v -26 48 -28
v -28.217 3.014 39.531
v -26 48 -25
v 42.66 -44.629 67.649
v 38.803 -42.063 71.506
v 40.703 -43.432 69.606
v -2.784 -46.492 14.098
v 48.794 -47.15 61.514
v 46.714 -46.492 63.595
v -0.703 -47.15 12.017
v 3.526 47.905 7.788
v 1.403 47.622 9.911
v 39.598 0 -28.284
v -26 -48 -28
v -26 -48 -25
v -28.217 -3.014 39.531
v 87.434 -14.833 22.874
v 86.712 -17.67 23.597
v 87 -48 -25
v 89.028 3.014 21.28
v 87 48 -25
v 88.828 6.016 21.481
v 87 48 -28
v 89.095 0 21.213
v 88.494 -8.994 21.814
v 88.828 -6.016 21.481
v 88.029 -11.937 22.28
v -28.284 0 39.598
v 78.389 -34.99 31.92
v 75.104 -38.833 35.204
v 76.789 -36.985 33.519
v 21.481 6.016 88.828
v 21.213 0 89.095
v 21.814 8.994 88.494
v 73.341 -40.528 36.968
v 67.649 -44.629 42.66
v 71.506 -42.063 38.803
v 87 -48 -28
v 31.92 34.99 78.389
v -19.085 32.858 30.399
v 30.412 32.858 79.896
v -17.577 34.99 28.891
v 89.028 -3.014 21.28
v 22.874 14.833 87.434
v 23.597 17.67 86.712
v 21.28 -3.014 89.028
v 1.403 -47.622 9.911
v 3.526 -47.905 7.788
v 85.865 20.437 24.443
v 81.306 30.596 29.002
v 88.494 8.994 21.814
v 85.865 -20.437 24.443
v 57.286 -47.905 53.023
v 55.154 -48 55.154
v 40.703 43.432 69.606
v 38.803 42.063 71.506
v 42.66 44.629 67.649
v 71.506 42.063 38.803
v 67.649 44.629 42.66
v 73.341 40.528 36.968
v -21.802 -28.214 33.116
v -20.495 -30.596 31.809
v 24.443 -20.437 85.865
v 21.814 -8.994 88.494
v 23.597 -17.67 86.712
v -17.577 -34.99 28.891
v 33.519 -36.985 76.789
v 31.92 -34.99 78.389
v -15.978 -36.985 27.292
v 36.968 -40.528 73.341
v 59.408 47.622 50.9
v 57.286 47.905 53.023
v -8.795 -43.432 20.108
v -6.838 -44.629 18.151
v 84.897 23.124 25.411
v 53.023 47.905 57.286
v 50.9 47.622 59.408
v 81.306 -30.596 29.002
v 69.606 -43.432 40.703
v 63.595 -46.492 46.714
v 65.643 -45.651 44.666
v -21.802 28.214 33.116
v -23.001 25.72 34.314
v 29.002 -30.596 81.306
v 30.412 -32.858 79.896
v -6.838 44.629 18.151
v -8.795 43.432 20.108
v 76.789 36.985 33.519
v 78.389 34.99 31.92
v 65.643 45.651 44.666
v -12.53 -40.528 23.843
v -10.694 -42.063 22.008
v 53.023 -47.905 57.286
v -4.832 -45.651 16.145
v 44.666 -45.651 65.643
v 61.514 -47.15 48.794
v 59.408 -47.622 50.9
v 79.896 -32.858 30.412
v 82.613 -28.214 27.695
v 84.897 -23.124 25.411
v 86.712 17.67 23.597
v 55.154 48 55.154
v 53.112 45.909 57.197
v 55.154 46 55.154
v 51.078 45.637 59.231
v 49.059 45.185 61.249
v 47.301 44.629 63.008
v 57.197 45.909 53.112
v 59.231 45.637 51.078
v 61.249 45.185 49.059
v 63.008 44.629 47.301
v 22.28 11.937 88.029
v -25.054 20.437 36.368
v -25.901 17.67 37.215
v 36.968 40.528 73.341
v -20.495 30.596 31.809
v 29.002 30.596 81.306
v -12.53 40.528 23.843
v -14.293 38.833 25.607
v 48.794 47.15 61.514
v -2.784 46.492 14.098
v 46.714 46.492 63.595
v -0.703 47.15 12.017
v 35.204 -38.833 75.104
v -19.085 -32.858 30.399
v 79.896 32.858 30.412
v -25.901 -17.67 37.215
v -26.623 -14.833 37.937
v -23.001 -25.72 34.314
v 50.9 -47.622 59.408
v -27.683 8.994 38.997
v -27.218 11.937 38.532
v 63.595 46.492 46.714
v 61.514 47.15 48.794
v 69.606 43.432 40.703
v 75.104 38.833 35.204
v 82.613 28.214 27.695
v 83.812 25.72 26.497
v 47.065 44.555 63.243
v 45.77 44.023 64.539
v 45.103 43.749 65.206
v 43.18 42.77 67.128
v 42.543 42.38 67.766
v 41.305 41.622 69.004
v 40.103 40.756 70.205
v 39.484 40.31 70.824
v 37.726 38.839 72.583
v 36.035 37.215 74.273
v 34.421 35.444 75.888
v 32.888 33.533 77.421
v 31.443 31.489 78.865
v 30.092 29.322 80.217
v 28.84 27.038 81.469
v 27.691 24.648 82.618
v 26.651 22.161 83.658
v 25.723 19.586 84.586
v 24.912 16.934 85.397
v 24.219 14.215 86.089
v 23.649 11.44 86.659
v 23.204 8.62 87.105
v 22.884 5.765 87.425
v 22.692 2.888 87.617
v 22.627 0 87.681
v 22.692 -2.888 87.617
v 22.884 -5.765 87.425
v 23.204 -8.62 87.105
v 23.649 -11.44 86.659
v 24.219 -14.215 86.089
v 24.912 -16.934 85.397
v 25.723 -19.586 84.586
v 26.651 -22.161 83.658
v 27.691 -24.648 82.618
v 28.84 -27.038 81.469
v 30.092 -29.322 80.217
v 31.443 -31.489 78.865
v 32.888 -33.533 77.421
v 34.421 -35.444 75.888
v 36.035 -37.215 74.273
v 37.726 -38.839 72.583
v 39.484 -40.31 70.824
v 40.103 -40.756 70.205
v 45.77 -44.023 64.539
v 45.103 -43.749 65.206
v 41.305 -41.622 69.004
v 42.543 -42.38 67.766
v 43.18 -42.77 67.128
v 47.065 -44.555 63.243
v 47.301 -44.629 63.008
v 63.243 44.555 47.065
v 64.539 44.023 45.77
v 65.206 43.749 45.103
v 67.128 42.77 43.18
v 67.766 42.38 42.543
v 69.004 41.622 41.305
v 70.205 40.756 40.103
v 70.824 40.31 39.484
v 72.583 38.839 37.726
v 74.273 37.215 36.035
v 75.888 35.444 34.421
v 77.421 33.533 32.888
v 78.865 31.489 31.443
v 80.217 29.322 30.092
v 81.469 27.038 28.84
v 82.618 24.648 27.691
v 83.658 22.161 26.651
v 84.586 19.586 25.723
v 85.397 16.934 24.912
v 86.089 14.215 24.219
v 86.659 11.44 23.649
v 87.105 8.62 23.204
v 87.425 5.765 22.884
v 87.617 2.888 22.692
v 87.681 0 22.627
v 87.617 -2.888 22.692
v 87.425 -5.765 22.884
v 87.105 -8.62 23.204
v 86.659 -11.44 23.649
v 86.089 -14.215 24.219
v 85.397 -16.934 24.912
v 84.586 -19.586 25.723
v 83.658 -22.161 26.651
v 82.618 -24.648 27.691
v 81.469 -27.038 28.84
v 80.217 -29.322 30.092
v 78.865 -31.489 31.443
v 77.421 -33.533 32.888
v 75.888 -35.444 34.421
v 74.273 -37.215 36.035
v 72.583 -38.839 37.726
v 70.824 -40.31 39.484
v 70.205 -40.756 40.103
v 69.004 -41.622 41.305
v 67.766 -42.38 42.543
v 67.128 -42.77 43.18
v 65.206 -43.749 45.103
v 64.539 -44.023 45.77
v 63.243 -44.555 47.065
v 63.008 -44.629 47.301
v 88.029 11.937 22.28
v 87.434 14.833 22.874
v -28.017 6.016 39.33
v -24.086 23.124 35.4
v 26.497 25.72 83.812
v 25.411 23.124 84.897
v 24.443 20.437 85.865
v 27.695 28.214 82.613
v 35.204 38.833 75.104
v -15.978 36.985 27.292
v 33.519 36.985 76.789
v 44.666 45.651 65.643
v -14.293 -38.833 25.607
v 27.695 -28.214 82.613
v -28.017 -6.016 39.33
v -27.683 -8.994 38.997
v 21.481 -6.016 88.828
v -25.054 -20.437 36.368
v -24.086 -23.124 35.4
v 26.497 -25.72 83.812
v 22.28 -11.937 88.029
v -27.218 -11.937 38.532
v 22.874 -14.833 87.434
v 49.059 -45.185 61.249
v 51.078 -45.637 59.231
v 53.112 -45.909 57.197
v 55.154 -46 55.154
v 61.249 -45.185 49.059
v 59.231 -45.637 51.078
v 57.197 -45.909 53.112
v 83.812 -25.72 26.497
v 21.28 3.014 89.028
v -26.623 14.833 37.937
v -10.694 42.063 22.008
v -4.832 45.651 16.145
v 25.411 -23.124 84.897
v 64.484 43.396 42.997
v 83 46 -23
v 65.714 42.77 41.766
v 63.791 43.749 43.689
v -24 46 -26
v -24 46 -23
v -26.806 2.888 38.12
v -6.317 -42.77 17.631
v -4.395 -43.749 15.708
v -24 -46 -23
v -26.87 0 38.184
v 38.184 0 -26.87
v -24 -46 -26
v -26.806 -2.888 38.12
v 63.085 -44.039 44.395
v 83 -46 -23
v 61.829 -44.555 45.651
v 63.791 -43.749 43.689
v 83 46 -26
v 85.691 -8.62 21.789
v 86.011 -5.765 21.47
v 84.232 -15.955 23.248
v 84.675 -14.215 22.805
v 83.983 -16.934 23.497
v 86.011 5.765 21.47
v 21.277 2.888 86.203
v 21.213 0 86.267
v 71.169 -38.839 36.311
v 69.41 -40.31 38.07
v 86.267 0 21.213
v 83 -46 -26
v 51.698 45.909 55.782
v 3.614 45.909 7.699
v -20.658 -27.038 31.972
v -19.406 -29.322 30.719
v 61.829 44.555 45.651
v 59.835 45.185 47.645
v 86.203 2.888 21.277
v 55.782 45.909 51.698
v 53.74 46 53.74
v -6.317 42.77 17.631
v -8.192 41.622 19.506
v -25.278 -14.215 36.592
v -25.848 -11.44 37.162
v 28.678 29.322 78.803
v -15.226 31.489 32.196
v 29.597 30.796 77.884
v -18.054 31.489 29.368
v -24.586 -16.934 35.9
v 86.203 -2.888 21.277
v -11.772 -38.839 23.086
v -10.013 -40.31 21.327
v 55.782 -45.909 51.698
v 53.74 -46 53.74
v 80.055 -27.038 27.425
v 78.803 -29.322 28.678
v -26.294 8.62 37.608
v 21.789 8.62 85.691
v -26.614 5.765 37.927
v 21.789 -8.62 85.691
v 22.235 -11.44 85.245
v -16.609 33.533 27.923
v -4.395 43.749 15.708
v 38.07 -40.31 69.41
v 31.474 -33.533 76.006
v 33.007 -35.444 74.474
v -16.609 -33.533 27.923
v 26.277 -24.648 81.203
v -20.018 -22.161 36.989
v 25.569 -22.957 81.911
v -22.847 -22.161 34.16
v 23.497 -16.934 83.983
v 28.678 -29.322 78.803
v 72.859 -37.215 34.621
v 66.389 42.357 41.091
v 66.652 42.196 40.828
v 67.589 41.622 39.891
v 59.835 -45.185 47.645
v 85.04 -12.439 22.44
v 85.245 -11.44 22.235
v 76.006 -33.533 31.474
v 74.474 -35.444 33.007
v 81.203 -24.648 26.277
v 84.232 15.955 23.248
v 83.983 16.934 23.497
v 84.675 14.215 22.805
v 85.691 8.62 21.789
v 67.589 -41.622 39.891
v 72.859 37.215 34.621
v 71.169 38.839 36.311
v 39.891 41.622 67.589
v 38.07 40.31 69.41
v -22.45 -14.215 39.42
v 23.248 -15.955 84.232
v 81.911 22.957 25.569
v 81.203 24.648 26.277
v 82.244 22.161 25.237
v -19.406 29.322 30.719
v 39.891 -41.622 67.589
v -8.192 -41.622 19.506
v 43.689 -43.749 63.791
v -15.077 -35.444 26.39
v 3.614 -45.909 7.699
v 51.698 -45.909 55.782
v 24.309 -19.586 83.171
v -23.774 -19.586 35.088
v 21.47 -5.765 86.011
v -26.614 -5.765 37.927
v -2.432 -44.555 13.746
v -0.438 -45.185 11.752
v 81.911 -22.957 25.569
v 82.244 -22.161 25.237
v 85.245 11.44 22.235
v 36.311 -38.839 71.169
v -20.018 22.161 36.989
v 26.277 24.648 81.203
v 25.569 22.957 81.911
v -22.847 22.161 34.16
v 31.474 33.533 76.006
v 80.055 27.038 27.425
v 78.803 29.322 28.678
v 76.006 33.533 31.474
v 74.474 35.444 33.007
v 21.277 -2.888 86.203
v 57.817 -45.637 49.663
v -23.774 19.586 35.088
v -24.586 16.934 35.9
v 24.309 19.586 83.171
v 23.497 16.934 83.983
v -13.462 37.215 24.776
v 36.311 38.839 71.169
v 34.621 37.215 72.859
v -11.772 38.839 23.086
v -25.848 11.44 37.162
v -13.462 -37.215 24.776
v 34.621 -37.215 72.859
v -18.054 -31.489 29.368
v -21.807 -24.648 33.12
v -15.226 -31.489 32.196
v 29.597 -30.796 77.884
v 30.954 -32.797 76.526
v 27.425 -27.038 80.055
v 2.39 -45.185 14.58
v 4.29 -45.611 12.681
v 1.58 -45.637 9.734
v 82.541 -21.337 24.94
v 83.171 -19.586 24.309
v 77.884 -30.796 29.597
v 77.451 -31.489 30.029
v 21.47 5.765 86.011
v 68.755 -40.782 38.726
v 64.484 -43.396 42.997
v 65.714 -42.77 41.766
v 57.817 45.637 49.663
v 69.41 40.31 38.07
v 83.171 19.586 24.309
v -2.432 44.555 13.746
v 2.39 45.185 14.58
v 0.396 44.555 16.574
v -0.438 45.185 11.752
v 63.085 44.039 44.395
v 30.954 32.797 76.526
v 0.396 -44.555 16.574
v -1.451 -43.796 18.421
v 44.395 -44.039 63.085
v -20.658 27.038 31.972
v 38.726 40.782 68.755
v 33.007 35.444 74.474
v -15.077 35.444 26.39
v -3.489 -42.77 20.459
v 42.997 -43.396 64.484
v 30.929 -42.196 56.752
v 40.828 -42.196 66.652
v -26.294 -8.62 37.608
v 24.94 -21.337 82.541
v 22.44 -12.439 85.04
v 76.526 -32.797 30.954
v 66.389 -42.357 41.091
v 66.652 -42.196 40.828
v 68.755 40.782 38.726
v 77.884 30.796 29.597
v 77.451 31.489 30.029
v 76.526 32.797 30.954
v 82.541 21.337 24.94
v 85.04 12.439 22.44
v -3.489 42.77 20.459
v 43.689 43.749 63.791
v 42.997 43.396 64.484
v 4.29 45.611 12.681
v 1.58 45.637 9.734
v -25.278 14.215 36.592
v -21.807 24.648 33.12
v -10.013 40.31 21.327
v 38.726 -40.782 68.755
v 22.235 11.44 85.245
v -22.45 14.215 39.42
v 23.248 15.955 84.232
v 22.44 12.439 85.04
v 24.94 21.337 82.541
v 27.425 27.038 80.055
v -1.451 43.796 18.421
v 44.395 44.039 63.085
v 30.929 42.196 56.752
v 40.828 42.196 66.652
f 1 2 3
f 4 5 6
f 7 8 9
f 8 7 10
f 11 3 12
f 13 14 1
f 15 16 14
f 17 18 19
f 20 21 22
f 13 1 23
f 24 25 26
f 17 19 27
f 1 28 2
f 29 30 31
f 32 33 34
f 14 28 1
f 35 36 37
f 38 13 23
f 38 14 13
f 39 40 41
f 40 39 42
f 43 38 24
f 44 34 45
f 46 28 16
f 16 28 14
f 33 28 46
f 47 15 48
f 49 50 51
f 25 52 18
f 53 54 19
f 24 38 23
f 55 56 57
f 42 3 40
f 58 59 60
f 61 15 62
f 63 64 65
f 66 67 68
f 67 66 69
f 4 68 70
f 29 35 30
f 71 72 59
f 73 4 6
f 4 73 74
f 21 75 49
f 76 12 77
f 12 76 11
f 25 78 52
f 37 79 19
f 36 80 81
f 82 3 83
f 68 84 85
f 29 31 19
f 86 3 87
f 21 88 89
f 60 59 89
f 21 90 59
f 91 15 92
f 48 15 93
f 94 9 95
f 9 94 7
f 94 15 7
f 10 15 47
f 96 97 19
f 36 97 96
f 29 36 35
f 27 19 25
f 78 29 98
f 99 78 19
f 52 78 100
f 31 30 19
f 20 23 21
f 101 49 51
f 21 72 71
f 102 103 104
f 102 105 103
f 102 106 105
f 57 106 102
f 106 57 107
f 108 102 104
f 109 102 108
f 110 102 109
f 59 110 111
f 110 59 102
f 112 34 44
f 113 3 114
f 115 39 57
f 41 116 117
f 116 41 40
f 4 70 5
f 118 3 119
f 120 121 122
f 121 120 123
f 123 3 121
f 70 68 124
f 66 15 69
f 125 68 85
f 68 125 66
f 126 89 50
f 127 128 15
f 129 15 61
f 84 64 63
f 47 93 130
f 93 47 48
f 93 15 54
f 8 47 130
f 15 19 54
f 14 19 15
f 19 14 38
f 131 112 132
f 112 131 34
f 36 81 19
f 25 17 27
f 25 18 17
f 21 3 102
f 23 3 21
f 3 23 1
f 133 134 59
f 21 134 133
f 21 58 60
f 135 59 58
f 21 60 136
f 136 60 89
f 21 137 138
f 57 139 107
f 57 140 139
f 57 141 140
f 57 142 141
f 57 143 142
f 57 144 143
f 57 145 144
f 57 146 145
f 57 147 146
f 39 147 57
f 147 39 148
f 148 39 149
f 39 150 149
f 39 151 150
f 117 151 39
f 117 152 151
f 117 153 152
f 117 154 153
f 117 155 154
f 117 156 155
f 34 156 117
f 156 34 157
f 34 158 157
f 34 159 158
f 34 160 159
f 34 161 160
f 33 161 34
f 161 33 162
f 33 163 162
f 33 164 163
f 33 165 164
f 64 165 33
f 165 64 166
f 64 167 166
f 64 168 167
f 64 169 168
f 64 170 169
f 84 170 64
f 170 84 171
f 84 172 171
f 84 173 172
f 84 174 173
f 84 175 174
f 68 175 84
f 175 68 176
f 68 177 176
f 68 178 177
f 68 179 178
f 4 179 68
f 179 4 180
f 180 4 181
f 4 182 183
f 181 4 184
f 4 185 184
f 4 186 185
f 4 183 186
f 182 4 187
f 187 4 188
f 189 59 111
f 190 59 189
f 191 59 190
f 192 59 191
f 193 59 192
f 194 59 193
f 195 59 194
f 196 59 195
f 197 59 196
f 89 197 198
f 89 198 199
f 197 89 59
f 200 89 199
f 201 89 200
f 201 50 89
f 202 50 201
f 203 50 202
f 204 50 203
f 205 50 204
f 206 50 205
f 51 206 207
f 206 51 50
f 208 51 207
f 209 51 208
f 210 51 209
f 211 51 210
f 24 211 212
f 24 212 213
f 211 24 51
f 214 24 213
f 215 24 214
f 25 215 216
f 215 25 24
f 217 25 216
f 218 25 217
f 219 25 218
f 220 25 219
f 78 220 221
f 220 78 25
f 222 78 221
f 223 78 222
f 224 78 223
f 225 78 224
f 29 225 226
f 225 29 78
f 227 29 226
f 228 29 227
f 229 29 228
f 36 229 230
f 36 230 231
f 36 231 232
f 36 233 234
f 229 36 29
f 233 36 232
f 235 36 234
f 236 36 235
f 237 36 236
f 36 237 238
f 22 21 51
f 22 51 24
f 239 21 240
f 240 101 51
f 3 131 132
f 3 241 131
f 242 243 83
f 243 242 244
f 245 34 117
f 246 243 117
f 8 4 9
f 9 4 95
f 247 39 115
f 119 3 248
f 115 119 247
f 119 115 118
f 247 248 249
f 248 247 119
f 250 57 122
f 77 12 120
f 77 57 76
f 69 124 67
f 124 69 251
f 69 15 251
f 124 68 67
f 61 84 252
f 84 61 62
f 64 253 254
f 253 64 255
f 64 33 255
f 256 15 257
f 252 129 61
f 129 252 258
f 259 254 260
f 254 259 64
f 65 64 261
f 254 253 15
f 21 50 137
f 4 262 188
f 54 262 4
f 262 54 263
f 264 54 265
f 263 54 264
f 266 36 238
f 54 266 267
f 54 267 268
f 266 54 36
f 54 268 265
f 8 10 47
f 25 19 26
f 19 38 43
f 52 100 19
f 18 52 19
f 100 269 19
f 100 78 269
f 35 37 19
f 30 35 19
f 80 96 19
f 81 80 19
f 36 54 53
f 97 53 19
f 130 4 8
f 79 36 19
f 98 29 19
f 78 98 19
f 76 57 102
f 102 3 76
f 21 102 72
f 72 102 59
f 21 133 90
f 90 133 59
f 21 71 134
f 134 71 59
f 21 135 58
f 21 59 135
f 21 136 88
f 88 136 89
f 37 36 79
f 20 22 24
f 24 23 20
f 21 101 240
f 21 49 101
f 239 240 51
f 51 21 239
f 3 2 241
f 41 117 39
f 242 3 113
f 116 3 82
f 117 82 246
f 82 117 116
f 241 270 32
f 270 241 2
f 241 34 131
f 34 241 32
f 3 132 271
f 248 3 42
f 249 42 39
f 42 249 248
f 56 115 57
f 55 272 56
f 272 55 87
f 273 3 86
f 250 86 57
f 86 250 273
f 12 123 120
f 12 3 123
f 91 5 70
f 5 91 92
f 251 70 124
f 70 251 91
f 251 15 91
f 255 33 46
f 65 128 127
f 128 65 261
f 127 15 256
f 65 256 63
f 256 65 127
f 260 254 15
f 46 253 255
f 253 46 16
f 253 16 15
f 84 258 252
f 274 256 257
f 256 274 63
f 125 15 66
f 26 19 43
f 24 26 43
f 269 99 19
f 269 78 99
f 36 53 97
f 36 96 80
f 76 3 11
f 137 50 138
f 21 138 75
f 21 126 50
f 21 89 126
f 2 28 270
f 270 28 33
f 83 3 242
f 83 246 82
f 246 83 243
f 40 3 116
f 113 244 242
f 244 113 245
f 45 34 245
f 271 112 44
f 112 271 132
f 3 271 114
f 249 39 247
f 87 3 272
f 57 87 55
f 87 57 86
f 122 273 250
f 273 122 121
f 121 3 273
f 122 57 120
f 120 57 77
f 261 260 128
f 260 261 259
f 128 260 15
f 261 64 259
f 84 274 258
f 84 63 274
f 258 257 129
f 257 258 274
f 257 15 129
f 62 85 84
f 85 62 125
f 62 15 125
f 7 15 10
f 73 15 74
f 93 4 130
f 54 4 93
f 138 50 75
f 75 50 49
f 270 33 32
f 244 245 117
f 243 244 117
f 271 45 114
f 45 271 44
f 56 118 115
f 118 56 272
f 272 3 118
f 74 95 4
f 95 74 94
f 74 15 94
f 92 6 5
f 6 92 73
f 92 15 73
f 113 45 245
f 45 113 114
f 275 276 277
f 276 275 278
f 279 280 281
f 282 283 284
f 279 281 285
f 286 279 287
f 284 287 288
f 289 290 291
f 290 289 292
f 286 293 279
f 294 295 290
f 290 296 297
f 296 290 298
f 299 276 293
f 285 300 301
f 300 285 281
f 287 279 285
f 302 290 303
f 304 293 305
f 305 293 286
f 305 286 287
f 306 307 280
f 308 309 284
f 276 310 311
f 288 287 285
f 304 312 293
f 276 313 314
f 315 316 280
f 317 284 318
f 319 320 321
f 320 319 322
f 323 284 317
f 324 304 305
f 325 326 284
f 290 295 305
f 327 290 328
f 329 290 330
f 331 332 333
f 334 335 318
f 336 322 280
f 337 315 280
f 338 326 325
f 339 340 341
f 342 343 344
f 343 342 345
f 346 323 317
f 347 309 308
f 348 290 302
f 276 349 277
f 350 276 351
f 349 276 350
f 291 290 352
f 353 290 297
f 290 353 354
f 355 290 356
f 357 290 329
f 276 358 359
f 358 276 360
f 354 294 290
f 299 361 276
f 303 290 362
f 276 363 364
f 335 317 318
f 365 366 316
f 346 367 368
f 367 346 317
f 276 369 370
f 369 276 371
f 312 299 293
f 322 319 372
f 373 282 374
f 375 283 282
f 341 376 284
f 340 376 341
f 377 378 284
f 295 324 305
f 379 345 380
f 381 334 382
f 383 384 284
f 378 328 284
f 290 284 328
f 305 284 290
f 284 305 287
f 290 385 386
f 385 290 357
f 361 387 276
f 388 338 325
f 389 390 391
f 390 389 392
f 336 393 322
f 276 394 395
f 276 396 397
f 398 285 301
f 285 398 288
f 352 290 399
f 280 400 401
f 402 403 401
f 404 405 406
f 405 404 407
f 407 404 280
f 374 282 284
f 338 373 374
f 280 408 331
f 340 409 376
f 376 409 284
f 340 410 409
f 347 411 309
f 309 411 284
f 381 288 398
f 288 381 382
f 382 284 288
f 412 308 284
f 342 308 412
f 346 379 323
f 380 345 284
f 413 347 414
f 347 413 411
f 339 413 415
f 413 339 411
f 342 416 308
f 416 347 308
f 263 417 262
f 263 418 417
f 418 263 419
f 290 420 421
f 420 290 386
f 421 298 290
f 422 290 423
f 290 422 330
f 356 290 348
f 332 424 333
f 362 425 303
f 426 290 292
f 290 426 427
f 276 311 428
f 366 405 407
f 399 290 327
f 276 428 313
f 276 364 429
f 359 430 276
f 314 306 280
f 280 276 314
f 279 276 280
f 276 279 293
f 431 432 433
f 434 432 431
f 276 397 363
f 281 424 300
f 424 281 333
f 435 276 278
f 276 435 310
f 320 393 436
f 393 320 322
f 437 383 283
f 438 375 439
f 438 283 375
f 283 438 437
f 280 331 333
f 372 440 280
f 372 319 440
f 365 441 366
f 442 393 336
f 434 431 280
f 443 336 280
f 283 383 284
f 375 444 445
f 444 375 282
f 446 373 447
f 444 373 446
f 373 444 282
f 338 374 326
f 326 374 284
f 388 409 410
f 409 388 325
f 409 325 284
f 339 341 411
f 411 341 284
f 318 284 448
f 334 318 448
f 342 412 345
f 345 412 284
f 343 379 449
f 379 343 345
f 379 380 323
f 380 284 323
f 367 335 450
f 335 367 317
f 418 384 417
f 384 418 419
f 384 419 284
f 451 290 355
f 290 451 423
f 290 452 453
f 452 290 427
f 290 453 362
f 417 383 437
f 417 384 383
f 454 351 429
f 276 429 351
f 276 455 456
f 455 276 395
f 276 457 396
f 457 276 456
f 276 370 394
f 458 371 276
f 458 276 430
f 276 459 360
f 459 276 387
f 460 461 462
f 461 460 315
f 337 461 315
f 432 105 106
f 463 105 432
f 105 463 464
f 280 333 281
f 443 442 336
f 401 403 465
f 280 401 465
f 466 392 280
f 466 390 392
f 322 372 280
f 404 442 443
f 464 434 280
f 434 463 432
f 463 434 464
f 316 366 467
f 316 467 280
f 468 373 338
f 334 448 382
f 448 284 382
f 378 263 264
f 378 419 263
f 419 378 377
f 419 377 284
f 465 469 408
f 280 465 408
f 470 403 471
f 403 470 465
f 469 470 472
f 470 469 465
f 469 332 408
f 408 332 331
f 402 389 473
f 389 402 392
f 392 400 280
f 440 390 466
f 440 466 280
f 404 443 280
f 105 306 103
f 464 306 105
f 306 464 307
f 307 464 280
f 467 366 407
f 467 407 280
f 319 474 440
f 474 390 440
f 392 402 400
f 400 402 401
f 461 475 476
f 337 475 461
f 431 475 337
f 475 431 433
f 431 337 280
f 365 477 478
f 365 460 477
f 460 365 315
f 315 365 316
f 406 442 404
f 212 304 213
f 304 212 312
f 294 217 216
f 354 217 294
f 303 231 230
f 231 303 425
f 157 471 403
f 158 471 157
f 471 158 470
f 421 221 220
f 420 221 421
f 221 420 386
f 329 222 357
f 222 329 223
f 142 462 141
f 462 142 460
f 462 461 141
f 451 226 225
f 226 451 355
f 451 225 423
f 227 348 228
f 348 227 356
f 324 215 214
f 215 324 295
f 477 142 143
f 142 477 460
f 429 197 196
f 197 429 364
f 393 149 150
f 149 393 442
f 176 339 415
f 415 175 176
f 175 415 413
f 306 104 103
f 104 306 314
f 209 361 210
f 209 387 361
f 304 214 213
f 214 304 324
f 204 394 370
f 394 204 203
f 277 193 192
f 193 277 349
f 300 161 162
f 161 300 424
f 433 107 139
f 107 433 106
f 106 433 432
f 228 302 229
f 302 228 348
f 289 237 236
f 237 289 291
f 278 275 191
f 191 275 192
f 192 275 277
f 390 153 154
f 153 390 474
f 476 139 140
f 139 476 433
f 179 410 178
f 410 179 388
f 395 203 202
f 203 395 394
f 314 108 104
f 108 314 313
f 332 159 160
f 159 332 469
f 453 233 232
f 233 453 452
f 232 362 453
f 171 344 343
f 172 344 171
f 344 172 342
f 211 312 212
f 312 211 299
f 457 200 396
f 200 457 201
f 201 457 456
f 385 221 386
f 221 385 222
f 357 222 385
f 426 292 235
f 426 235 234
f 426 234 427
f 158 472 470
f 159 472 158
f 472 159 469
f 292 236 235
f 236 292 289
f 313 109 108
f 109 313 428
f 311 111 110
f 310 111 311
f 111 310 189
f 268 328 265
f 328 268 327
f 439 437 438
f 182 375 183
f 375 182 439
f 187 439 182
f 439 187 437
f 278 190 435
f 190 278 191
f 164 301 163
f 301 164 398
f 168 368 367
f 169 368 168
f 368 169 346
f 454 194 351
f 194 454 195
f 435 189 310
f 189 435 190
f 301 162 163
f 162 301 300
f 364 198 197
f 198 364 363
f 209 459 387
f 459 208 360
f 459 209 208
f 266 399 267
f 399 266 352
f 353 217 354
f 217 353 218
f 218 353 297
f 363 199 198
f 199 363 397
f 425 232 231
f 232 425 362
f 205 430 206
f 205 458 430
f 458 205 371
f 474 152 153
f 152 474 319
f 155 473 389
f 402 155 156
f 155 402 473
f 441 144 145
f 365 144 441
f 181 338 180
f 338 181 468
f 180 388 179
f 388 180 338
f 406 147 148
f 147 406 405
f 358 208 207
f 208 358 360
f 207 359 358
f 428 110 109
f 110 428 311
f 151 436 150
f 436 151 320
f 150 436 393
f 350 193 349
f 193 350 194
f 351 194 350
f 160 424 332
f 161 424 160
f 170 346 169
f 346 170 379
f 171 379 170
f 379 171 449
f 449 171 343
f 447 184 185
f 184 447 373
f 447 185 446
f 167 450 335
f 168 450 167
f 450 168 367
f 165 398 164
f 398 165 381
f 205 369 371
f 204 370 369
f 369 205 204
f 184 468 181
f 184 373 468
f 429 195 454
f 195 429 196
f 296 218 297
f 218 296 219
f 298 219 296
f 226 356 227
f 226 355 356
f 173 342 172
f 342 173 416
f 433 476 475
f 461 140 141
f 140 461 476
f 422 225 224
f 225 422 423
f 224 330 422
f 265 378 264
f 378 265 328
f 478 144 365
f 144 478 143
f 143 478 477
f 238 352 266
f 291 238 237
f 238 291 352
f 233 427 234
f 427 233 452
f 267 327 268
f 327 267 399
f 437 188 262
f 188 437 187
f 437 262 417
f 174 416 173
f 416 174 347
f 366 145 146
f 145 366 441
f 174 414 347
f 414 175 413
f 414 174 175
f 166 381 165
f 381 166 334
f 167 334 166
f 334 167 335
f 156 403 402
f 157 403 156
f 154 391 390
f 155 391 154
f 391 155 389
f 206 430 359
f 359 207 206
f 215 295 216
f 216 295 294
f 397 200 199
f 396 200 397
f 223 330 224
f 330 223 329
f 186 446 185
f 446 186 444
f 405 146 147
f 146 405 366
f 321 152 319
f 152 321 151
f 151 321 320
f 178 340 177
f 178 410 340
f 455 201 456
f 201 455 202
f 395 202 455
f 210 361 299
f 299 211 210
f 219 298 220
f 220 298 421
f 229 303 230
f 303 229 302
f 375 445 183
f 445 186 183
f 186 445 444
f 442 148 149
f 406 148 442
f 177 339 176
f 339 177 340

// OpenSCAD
// file: lib/arduino.scad
module stepper(plusminus=0,tolerance=0){
	translate([0,-8,0]) rotate([0,90,0]){
		tl=tolerance;
		tz=tolerance;
		txy=tolerance;
		motorW=28+tl;
		motorH=19+tl;
		if (plusminus>0){
			translate([0,0, 35/2]) rotate([0,90,0])  cylinder(4,3.5/2,3.5/2);
			translate([0,0,-35/2]) rotate([0,90,0])  cylinder(4,3.5/2,3.5/2);
		}
		if (plusminus<0){
			translate([-5-0.111,8,0]) rotate([0,90,0])  cylinder(5+0.222,10/2,10/2);
		}
		// full motor view
		if (plusminus==0){
			difference(){
				union(){
					translate([0,0, 35/2]) rotate([0,90,0])  cylinder(1,7/2+txy,7/2+txy); // ear
					translate([0,0,-35/2]) rotate([0,90,0])  cylinder(1,7/2+txy,7/2+txy); // ear
					translate([0.5,0,0])   cube([1,7+2*txy,35], center=true); // ear box
				}
				translate([-0.111,0, 35/2]) rotate([0,90,0])  cylinder(4+0.222,3.5/2,3.5/2); // holes
				translate([-0.111,0,-35/2]) rotate([0,90,0])  cylinder(4+0.222,3.5/2,3.5/2); // holes
			}
			translate([0,0,0])   rotate([0,90,0])  cylinder(motorH,motorW/2,motorW/2); //motor
			translate([-2, 8,0]) rotate([0,90,0])  cylinder(2,10/2+txy,10/2+txy); 
			translate([-10,8,0]) rotate([0,90,0])  
				intersection(){
					cylinder(10,5/2+txy,5/2+txy);  //shaft
					cubeZ0(5/2+2*txy,10,10);
				}
			translate([motorH/2,-18/2,0]) cube([motorH,18+txy,18+2*txy],center=true);
		}
	}
}

module stepper_(plusminus,tolerance=0){
		tl=tolerance;
		motorW=28+tl;
		motorH=19+tl;
		if (plusminus>0){
			translate([0,0, 35/2]) rotate([0,90,0])  cylinder(4,3.5/2,3.5/2);
			translate([0,0,-35/2]) rotate([0,90,0])  cylinder(4,3.5/2,3.5/2);
		}
		if (plusminus<0){
			translate([-5-0.111,8,0]) rotate([0,90,0])  cylinder(5+0.222,10/2,10/2);
		}
		if (plusminus==0){
			difference(){
				union(){
					translate([0,0, 35/2]) rotate([0,90,0])  cylinder(1,7/2,7/2);
					translate([0,0,-35/2]) rotate([0,90,0])  cylinder(1,7/2,7/2);
					translate([0.5,0,0])   cube([1,7,35], center=true);
				}
				translate([-0.111,0, 35/2]) rotate([0,90,0])  cylinder(4+0.222,3.5/2,3.5/2); // holes
				translate([-0.111,0,-35/2]) rotate([0,90,0])  cylinder(4+0.222,3.5/2,3.5/2); // holes
			}
			translate([0,0,0]) rotate([0,90,0])  cylinder(motorH,motorW/2,motorW/2); //motor
			translate([-2, 8,0]) rotate([0,90,0])  cylinder(2,10/2,10/2); 
			translate([-10,8,0]) rotate([0,90,0])  cylinder(10,5/2,5/2);  //shaft
			translate([motorH/2,-18/2,0]) cube([motorH,18,18],center=true);
		}
}
// file: lib/mylib.scad
/*
module rounded_cube(dx,dy,dz,r){
    union(){
        translate ([r,0,0]) cube([dx-2*r,dy,dz]);
        translate ([0,r,0]) cube([dx,dy-2*r,dz]);
        translate ([r,r,0]) cylinder(dz,r,r);
        translate ([dx-r,r,0]) cylinder(dz,r,r);
        translate ([r,dy-r,0]) cylinder(dz,r,r);
        translate ([dx-r,dy-r,0]) cylinder(dz,r,r);
    }
}
*/

module torus(R,r) {
    rotate_extrude(convexity = 10)
    translate([R, 0, 0]) circle(r = r, $fn = 100);
}

module disk(R,r){
    rotate_extrude(convexity = 10)
    { 
        intersection(){
            union(){
                translate([R-r, 0, 0]) circle(r = r, $fn = 100);
                translate([(R-r)/2,0]) square([R-r,r*2],center=true);        
            }
            translate([0,-r,0]) square([R,2*r]);            
        }
    }
}


module rounded_cylinder(h,r,rb,rt){
    rotate_extrude(convexity = 10) 
    mirror() rotate([0,0,90])
    intersection(){
        square([h,r]);
        union(){
            translate([h-rt,0,0]) square([rt,r-rt]);
            translate([h-rt,r-rt,0]) 
            intersection(){
                circle(rt);
                square(rt*2);
            }
            square([rb,r-rb]);
            translate([0,r-rb,0]) intersection(){
                translate([rb,0,0]) circle(rb);
                translate([-rb,0,0]) square(rb*2);
            }    
            translate([rb,0,0]) square([h-rt-rb,r]);
        }
    }
    /*
    translate([0,0,h-rt]) disk(r,rt);
    translate([0,0,rb]) cylinder(h-rb-rt,r,r);
    translate([0,0,rb]) disk(r,rb);
    */
}

module rounded_cube(w,l,h,rv,rb,rt){
	hull(){
		translate([-w/2+rv,-l/2+rv,0]) rounded_cylinder(h,rv,rb,rt);
		translate([-w/2+rv,+l/2-rv,0]) rounded_cylinder(h,rv,rb,rt);
		translate([+w/2-rv,+l/2-rv,0]) rounded_cylinder(h,rv,rb,rt);
		translate([+w/2-rv,-l/2+rv,0]) rounded_cylinder(h,rv,rb,rt);
	}
    
   /* 
    minkowski(){
        cube([w-2*rv,l-2*rv,h-rb-rt],center=true) ;
        //rounded_cylinder(rb+rt,rv,rb,rt);
        rounded_cylinder(7,10,5,2);
    }
    */
    
}

module cubeZ0(xSize,ySize,zSize){
    translate([0,0,zSize/2]) cube([xSize,ySize,zSize],center=true);
}
module cubeYZ0(xSize,ySize,zSize){
    translate([0,-ySize/2,0]) cube([xSize,ySize,zSize]);
}
module cubeXZ0(xSize,ySize,zSize){
    translate([-xSize/2,0,0]) cube([xSize,ySize,zSize]);
}
module cubeYZ0(xSize,ySize,zSize){
    translate([0,-ySize/2,0]) cube([xSize,ySize,zSize]);
}

module skiletZ0(xSize,ySize,zSize,step=0.8,w=0.1){
    for(y=[-ySize/2:step:ySize/2]){
		for(x=[-xSize/2:step:xSize/2]){
			translate([x,y,0]) cubeZ0(w,w,zSize);
		}
    }

}


module arced_cube(xSize,ySize,zCube){
	radius = xSize/2;
	cubeZ0(ySize,radius*2,zCube);
	
	translate([0,0,zCube]) intersection(){
		cubeZ0(ySize,radius*2,radius);
		rotate([0,90,0]) translate([0,0,-ySize/2]) cylinder(ySize,radius,radius);
	}
	
}

module prism(l, w, h){
       polyhedron(
               points=[[0,0,0], [l,0,0], [l,w,0], [0,w,0], [0,w,h], [l,w,h]],
               faces=[[0,1,2,3],[5,4,3,2],[0,4,5,1],[0,3,4],[5,2,1]]
               );
       
    /*   // preview unfolded (do not include in your function
       z = 0.08;
       separation = 2;
       border = .2;
       translate([0,w+separation,0])
           cube([l,w,z]);
       translate([0,w+separation+w+border,0])
           cube([l,h,z]);
       translate([0,w+separation+w+border+h+border,0])
           cube([l,sqrt(w*w+h*h),z]);
       translate([l+border,w+separation+w+border+h+border,0])
           polyhedron(
                   points=[[0,0,0],[h,0,0],[0,sqrt(w*w+h*h),0], [0,0,z],[h,0,z],[0,sqrt(w*w+h*h),z]],
                   faces=[[0,1,2], [3,5,4], [0,3,4,1], [1,4,5,2], [2,5,3,0]]
                   );
       translate([0-border,w+separation+w+border+h+border,0])
           polyhedron(
                   points=[[0,0,0],[0-h,0,0],[0,sqrt(w*w+h*h),0], [0,0,z],[0-h,0,z],[0,sqrt(w*w+h*h),z]],
                   faces=[[1,0,2],[5,3,4],[0,1,4,3],[1,2,5,4],[2,0,3,5]]
                   );
				   */
       }
       
module cylinder_xyz(x,y,z,r0,r1){
    h = sqrt(x*x+y*y+z*z);
    rotate([0,acos(z/h),atan2(y,x)]) cylinder(h,r0,r1);
}       
module cylinder_2xyz(x0,y0,z0,x1,y1,z1,r0,r1){
    dx=x1-x0;
    dy=y1-y0;
    dz=z1-z0;
    translate([x0,y0,z0]) cylinder_xyz(dx,dy,dz,r0,r1);

}
       $fn=100;
//cylinder_xyz( 20,20,20,1);
//cylinder_2xyz(10,10,10,1, 20,20,20,1,1);

//      b1 ------- b2 
//     /          /|
//    b0 -------- b3
//    |          |
//
//                |
//    |         | |
//    | a1------+-a2 
//    |/        |/
//    a0------- a3

module poly8(a0,a1,a2,a3,
             b0,b1,b2,b3)
{
    polyhedron(points=[a0,a1,a2,a3, b0,b1,b2,b3],
               faces = [[0,3,2,1],[4,4+1,4+2,4+3],[0,1,4+1,4],[1,2,4+2,4+1],[3,4+3,4+2,2],[0,4,4+3,3]]);
    
    
}

//poly8 ([0,0,0],[0,0,1],[1,0,1],[1,1,0],  [0,20,0],[0,20,1],[1,20,1],[1,19,0] );

/*
intersection(){
    cube(10);
    poly8 ([0,0,0],[0,3,0],[3,3,0],[3,0,0],        [0,0,3],[0,1,3],[1,1,3],[1,0,3]);
}
*/
//    poly8 ([0,0,0],[0,3,0],[3,3,0],[3,0,0],        [0,0,3],[0,1,3],[1,1,3],[1,0,3]);




module rounded_arc_int_(h,rb,wb,rbint,rbext,
                          rt,wt,rtint,rtext, ang)  
{
    difference(){
        rotate_extrude(angle=ang) 
        hull(){
            translate([rb+rbint,rbint]) circle(rbint);
            translate([rb+wb-rbext,rbext]) circle(rbext);
            
            translate([rt+rtint,h-rtint]) circle(rtint);
            translate([rt+wt-rtext,h-rtext]) circle(rtext);
        }   
    }

          
}
module rounded_arc_int(h,rb,wb,rbint,rbext,
                         rt,wt,rtint,rtext, ang, roundendface=false)  
 {
    
    if (roundendface){
        difference(){
            rounded_arc_int_(h,rb,wb,rbint,rbext, rt,wt,rtint,rtext, ang);  
            rotate ([0,0,ang]) 
                mirror([0,1,0]) 
                    poly8(  [rb,0,0],[rb,rbint,0],[rb+wb,rbext,0],[rb+wb,0,0],
                            [rt,0,h],[rt,rtint,h],[rt+wt,rtext,h],[rt+wt,0,h]);
            poly8(  [rb,0,0],[rb,rbint,0],[rb+wb,rbext,0],[rb+wb,0,0],
                    [rt,0,h],[rt,rtint,h],[rt+wt,rtext,h],[rt+wt,0,h]);
          
        
        }
    }
    else {
           rounded_arc_int_(h,rb,wb,rbint,rbext, rt,wt,rtint,rtext, ang);  
    }
    
    if (roundendface){
        hull(){
            translate([rb+rbint,rbint,rbint]) sphere (rbint);
            translate([rb-rbext+wb,rbext,rbext]) sphere (rbext);
            translate([rt+rtint,rtint,h-rtint]) sphere (rtint);
            translate([rt-rtext+wt,rtext,h-rtext]) sphere (rtext);
           // cylinder_2xyz(rb+roundb,roundb,roundb,rb-roundb+wb,roundb,roundb,roundb,roundb);
           // cylinder_2xyz(rb+roundb,roundb,roundb,rt+roundt,roundt,h-roundt,roundb,roundt);
           // cylinder_2xyz(0,0,0,10,10,10,roundb,roundb);
       }
        hull(){
            rotate([0,0,ang]) translate([rb+rbint,-rbint,rbint]) sphere (rbint);
            rotate([0,0,ang]) translate([rb-rbext+wb,-rbext,rbext]) sphere (rbext);
            rotate([0,0,ang]) translate([rt+rtint,-rtint,h-rtint]) sphere (rtint);
            rotate([0,0,ang]) translate([rt-rtext+wt,-rtext,h-rtext]) sphere (rtext);
           
           
           // cylinder_2xyz(rb+roundb,roundb,roundb,rb-roundb+wb,roundb,roundb,roundb,roundb);
           // cylinder_2xyz(rb+roundb,roundb,roundb,rt+roundt,roundt,h-roundt,roundb,roundt);
           // cylinder_2xyz(0,0,0,10,10,10,roundb,roundb);
       }

    }
}

//rounded_arc_int(10,20,10,1,2,                    20,10,3,4,90,false);
// file: lib/tubes.scad
module tube_ext(h,r1,r2,width) {
	difference(){
		cylinder(h,r1,r2);
        translate([0,0,-0.01]) cylinder(h+0.02,r1-width,r2-width);
	}
}

module tube_int(h,r1,r2,width) {
	difference(){
		cylinder(h,r1+width,r2+width);
        translate([0,0,-0.01]) cylinder(h+0.02,r1,r2);
	}
}
// main file
include <lib/tubes.scad>
include <lib/mylib.scad>
include <lib/arduino.scad>

watchH = 10;
watchR = 45/2;
beltR  = 70/2;
beltW  = 28;

baseH  = beltR*2+8;
baseR  = beltR+10;
module watch(){
    translate([0,0,beltR-watchH])  cylinder(watchH,watchR,watchR);
	translate([-beltW/2,0,0]) rotate([0,90,0])  cylinder(beltW,beltR,beltR);
}
module watchdiff(){
	translate([0,0,beltR-watchH])  cylinder(watchH,watchR,watchR);
	translate([-beltW/2,0,0]) rotate([0,90,0])  cylinder(beltW,beltR,beltR);
	cubeZ0(beltW,beltR*2,beltR);
}
module base(){
	
	
	difference(){
		union(){
		
			translate([0,0,baseR-10]) cylinder(baseH-baseR+10,baseR,baseR); //base tube
			cylinder(baseR-10,11,baseR); //base tube
		}
		translate([0,0,baseH-2*beltR+0.1]) 	translate([0,0,beltR]) watchdiff();
		stepper(0,0.2);
		//cubeZ0(baseR*2,baseR*2,baseR-10);
	}
	%color("blue") translate([0,0,10+beltR+0.1]) watch();
	%color("blue") stepper(0,0.2);
	
}
//watchdiff();
//rotate([0,45,0]) base();
difference(){
	hull(){
		translate([-26,0,-28]) cubeYZ0(113,(baseR+3)*2,3);
		rotate([0,45,0]) translate([0,0,8]) cylinder(70,baseR+3,baseR+3);
	}
	hull(){
		translate([-26+2,0,-28+2]) cubeYZ0(111-4,(baseR+3)*2-4,3);
		rotate([0,45,0]) translate([0,0,8]) cylinder(68,baseR+1,baseR+1);
	}
	//translate([55,0,55]) rotate([0,45,0]) cubeZ0(baseR*3,baseR*3,baseR*3);
	rotate([0,45,0]) translate([0,0,12]) cylinder(100,baseR+1,baseR+1);
	rotate([0,45,0]) translate([0,0,0]) cylinder(12, 25,baseR+1);
}
